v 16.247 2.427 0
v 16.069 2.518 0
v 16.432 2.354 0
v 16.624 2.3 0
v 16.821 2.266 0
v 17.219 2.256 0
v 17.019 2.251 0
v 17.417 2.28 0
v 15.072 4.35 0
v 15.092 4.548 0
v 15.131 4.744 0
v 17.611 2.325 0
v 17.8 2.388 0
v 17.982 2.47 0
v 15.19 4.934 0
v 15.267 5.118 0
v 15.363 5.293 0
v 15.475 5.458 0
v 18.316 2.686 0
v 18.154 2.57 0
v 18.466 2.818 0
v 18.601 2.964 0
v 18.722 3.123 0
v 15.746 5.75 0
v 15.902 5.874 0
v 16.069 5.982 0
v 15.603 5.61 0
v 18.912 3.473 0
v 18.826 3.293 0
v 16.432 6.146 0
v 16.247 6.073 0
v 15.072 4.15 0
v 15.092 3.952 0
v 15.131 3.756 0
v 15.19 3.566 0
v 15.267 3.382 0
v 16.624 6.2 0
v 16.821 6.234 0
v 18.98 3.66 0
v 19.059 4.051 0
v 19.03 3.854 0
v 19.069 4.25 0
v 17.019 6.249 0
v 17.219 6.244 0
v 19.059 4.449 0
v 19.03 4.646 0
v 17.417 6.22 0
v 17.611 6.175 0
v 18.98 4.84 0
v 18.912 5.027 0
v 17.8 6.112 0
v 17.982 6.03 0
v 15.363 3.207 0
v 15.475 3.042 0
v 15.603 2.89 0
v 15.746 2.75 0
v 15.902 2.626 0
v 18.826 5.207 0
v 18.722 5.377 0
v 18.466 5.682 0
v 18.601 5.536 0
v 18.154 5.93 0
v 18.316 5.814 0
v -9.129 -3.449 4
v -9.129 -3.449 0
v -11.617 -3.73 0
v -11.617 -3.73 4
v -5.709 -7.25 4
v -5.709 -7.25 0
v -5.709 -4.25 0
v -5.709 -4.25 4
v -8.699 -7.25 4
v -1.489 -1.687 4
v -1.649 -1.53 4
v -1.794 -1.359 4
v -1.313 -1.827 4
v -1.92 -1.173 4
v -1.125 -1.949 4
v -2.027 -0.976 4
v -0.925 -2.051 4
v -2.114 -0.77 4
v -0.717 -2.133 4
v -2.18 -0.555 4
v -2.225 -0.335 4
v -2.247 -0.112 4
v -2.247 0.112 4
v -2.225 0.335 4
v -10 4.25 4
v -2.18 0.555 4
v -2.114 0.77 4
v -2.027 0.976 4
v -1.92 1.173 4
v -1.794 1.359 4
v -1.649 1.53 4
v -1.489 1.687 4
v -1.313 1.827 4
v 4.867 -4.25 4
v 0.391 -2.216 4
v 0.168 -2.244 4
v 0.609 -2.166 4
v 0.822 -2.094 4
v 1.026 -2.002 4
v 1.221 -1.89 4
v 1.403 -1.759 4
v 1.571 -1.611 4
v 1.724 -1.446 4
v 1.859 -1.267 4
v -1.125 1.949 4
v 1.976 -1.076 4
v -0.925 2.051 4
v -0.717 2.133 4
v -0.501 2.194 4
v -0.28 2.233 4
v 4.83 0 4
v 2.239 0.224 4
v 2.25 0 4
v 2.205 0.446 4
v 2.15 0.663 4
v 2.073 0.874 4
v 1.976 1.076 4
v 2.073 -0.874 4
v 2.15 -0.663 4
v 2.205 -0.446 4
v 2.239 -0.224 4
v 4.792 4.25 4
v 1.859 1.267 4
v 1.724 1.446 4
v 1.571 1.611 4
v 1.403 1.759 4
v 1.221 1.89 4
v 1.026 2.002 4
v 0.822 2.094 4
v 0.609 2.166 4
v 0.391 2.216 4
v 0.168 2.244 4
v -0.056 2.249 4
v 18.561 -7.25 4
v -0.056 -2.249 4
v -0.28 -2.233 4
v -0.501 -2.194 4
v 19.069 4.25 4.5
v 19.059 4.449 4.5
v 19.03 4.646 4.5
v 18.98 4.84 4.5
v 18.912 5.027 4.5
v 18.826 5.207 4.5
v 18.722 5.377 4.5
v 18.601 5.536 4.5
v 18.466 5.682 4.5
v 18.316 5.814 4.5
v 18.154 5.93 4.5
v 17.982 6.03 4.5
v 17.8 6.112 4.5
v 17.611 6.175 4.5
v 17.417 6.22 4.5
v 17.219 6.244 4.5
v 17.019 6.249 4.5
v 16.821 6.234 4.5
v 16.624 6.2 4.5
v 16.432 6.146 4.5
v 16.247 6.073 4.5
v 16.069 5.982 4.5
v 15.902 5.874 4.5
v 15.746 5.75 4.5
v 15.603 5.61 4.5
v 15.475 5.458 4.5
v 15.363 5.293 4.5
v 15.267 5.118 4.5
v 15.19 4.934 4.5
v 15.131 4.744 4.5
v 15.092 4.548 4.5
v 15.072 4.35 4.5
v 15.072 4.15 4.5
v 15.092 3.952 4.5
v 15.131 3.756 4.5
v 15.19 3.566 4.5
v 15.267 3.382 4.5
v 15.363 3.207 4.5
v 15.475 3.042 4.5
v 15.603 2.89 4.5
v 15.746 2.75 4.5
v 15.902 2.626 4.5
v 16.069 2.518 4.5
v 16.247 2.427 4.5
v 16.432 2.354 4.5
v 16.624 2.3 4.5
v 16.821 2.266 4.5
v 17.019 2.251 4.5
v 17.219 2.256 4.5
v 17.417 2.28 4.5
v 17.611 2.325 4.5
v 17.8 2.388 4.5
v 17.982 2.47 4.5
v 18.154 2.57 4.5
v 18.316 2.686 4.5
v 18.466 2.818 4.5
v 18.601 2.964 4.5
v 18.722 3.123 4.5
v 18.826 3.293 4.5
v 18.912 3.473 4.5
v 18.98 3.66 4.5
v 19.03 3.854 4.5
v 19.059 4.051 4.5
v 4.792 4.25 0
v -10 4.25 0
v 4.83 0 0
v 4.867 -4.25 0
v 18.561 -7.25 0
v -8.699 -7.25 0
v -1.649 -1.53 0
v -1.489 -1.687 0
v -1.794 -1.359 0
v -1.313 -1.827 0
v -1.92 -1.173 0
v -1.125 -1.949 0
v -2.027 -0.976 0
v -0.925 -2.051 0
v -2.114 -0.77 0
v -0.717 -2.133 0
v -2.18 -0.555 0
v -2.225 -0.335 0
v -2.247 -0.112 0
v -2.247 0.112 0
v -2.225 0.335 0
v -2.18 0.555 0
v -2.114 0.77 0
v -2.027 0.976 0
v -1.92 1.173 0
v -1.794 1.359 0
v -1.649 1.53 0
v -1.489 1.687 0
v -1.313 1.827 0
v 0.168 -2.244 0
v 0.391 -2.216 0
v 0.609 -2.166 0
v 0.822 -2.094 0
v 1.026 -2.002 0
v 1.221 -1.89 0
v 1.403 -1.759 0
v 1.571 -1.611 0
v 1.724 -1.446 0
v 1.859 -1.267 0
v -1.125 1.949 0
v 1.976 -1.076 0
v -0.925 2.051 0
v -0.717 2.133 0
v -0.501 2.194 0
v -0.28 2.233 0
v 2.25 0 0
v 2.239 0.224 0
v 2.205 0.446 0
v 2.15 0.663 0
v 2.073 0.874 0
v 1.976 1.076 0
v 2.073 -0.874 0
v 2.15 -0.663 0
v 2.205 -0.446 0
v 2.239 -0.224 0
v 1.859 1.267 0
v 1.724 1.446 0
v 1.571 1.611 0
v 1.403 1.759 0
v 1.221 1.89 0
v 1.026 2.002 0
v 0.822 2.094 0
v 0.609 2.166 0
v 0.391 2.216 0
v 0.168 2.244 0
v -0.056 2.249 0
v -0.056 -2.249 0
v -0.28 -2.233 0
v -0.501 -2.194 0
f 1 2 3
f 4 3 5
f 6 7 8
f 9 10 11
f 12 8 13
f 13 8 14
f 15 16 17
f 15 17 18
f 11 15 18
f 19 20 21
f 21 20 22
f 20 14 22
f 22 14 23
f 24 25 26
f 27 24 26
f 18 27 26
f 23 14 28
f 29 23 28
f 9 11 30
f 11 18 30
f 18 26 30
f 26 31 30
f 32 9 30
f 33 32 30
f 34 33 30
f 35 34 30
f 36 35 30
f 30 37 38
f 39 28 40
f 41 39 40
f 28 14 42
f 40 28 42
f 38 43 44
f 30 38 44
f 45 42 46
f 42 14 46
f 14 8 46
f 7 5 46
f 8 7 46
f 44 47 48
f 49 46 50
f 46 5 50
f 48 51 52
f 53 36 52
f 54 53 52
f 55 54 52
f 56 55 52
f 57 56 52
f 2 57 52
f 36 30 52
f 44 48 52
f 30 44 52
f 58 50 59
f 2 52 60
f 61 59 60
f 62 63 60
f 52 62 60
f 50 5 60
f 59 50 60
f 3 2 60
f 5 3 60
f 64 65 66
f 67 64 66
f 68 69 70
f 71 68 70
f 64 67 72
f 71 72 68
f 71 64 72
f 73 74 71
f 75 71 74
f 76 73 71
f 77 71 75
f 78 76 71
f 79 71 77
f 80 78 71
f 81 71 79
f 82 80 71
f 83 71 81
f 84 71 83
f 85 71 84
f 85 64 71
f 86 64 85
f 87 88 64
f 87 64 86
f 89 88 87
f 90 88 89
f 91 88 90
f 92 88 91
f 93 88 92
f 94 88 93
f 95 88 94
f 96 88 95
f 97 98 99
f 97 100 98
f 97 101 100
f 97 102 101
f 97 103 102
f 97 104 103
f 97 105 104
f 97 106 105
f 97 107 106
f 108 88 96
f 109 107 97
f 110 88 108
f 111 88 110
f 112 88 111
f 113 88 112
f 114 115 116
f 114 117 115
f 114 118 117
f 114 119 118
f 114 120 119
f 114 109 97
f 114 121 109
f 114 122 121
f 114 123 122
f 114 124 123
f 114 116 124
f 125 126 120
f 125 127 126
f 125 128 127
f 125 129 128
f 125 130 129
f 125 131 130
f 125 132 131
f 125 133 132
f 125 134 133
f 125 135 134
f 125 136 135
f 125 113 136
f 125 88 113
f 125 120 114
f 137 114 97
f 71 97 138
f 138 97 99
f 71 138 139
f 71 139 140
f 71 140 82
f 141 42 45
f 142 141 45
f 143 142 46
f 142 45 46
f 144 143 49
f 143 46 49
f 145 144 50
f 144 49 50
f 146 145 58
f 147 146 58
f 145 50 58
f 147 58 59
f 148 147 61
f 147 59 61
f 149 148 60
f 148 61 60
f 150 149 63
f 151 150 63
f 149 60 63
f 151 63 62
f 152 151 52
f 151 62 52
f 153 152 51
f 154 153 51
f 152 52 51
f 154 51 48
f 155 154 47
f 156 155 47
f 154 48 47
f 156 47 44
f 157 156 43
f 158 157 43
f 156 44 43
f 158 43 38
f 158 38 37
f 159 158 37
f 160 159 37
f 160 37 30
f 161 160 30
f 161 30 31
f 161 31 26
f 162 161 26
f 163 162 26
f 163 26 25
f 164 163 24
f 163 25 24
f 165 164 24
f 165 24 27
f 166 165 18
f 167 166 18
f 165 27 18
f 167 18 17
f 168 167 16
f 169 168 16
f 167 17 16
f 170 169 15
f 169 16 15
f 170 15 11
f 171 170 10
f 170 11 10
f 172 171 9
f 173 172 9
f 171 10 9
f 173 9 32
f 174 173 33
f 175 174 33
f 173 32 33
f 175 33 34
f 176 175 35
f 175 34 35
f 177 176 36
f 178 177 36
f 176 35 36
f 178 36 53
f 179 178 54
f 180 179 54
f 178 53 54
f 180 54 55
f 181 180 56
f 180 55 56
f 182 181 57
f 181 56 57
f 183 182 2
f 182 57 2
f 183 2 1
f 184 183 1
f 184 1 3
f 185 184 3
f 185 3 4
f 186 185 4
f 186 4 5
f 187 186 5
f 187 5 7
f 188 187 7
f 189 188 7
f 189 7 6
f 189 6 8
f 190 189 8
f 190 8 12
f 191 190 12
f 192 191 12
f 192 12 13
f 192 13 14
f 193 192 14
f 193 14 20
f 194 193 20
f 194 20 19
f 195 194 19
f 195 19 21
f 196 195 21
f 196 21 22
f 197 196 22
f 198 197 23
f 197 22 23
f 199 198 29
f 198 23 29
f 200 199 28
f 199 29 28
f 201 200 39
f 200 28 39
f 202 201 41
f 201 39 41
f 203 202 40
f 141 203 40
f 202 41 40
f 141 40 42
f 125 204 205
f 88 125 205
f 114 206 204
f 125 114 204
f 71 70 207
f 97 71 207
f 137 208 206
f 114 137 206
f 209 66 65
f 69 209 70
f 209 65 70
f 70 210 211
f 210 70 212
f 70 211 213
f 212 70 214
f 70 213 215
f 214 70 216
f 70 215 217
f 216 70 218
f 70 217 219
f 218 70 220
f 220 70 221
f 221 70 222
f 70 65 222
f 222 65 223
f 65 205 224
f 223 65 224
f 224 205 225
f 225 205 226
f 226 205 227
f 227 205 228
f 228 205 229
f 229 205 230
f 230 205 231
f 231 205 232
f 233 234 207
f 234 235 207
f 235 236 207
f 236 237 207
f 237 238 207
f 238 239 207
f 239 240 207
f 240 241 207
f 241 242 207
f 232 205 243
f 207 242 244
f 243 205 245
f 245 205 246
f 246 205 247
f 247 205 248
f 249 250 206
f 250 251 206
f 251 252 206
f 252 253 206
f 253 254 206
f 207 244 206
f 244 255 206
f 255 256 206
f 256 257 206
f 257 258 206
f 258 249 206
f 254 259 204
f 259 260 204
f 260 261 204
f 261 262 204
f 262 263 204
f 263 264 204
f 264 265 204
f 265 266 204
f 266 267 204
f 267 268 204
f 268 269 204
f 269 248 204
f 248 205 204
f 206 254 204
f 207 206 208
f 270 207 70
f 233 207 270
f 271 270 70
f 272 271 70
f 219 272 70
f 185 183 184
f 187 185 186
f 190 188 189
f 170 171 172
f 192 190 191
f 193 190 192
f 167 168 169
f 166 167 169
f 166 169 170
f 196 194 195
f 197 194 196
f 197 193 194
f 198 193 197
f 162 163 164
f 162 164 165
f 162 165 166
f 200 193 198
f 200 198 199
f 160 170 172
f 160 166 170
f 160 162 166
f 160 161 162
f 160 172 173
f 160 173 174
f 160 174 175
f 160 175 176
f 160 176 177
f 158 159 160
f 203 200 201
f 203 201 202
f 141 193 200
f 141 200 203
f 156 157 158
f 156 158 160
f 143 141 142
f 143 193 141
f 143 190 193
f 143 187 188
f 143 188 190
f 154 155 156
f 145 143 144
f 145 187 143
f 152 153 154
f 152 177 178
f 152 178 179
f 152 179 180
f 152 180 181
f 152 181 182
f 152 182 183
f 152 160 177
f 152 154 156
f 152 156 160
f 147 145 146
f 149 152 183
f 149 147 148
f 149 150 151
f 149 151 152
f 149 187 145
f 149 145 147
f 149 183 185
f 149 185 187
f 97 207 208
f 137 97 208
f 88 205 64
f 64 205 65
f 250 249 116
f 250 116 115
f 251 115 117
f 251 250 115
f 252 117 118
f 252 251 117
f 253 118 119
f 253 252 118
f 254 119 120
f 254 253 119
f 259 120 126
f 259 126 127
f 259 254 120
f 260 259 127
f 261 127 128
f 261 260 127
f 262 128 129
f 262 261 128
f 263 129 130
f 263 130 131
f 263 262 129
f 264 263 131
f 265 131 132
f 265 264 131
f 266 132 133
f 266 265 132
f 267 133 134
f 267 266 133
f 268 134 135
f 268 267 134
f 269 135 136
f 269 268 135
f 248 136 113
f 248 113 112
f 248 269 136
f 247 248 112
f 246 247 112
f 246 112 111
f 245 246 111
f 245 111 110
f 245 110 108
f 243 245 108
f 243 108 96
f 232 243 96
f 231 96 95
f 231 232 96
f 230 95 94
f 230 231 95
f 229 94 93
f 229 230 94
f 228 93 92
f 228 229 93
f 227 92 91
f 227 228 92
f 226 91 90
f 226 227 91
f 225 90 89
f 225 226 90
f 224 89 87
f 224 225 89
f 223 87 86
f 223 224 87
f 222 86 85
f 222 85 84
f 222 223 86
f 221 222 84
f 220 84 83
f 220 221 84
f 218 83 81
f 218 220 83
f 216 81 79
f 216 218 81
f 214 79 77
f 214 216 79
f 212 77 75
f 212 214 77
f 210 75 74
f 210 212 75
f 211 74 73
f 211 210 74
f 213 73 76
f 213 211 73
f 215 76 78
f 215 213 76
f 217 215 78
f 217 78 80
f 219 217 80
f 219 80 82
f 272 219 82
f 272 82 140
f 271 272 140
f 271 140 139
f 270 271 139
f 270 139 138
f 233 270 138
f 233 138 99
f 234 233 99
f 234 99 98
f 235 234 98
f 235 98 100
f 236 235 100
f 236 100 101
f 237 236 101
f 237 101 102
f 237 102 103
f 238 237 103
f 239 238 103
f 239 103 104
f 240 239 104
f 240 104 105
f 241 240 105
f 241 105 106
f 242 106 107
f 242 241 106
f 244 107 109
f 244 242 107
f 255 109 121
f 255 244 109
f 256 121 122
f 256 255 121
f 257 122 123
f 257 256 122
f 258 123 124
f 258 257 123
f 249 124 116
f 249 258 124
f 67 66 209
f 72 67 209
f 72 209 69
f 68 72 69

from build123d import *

# Parameters (mm, degrees)
F0_R     = 2.25
F1_DEPTH = 4
F0_R_2   = 2
F2_DEPTH = 4.5


# Not quite as in the source:
# - a feature names something its author has since deleted; it is built from what else it names


with BuildPart() as f1:
    # F0 (on Top) → F1 (new body)
    with BuildSketch(Plane.XY):
        Polygon((-8.6991069838, -7.25), (-5.7089743204, -7.25), (-5.7089743204, -4.25), (4.8668961972, -4.25), (4.8295045272, 0), (4.7921128571, 4.25), (-10, 4.25), (-9.1290873029, -3.4489390308), align=None)
        Circle(F0_R, mode=Mode.SUBTRACT)
        Polygon((4.8295045272, 0), (4.8668961972, -4.25), (18.5611117631, -7.25), align=None)
        Polygon((-11.6174062714, -3.7304204889), (-8.6991069838, -7.25), (-9.1290873029, -3.4489390308), align=None)
    extrude(amount=F1_DEPTH)


with BuildPart() as f2:
    # F0 (on Top) → F2 (new body)
    with BuildSketch(Plane.XY):
        with Locations((17.0693118125, 4.25)):
            Circle(F0_R_2)
    extrude(amount=F2_DEPTH)


solid = Compound([f1.part, f2.part])
